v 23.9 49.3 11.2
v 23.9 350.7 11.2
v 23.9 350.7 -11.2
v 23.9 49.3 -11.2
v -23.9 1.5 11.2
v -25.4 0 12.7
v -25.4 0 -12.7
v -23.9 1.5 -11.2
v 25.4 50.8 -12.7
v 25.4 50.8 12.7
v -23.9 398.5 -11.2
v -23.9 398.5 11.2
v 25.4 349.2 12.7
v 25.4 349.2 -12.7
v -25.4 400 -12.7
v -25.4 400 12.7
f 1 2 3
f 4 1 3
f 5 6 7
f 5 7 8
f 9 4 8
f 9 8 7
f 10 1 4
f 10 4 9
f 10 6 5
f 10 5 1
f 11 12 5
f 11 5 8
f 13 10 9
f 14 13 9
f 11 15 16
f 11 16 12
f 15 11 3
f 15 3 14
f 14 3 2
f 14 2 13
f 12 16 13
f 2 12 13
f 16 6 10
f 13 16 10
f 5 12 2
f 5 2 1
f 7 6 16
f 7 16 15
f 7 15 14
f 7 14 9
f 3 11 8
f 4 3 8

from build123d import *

# Parameters (mm, degrees)
CROQUIS1_W              = 50.8
CROQUIS1_H              = 25.4
CROQUIS1_W_2            = 47.8
CROQUIS1_H_2            = 22.4
SALIENTE_EXTRUIR1_DEPTH = 400
CORTAR_EXTRUIR1_DEPTH   = 26


with BuildPart() as part:
    # Croquis1 → Saliente-Extruir1 (new body)
    with BuildSketch(Plane(origin=(0, 0, 0), x_dir=(1, 0, 0), z_dir=(0, 1, 0))):
        Rectangle(CROQUIS1_W, CROQUIS1_H)
        Rectangle(CROQUIS1_W_2, CROQUIS1_H_2, mode=Mode.SUBTRACT)
    extrude(amount=SALIENTE_EXTRUIR1_DEPTH)

    # Croquis2 → Cortar-Extruir1 (cut)
    with BuildSketch(Plane.XY.offset(12.7)):
        Polygon((-25.4, 0), (25.4, 50.8), (25.4, 0), align=None)
        Polygon((25.4, 400), (-25.4, 400), (25.4, 349.2), align=None)
    extrude(amount=-CORTAR_EXTRUIR1_DEPTH, mode=Mode.SUBTRACT)


solid = part.part
